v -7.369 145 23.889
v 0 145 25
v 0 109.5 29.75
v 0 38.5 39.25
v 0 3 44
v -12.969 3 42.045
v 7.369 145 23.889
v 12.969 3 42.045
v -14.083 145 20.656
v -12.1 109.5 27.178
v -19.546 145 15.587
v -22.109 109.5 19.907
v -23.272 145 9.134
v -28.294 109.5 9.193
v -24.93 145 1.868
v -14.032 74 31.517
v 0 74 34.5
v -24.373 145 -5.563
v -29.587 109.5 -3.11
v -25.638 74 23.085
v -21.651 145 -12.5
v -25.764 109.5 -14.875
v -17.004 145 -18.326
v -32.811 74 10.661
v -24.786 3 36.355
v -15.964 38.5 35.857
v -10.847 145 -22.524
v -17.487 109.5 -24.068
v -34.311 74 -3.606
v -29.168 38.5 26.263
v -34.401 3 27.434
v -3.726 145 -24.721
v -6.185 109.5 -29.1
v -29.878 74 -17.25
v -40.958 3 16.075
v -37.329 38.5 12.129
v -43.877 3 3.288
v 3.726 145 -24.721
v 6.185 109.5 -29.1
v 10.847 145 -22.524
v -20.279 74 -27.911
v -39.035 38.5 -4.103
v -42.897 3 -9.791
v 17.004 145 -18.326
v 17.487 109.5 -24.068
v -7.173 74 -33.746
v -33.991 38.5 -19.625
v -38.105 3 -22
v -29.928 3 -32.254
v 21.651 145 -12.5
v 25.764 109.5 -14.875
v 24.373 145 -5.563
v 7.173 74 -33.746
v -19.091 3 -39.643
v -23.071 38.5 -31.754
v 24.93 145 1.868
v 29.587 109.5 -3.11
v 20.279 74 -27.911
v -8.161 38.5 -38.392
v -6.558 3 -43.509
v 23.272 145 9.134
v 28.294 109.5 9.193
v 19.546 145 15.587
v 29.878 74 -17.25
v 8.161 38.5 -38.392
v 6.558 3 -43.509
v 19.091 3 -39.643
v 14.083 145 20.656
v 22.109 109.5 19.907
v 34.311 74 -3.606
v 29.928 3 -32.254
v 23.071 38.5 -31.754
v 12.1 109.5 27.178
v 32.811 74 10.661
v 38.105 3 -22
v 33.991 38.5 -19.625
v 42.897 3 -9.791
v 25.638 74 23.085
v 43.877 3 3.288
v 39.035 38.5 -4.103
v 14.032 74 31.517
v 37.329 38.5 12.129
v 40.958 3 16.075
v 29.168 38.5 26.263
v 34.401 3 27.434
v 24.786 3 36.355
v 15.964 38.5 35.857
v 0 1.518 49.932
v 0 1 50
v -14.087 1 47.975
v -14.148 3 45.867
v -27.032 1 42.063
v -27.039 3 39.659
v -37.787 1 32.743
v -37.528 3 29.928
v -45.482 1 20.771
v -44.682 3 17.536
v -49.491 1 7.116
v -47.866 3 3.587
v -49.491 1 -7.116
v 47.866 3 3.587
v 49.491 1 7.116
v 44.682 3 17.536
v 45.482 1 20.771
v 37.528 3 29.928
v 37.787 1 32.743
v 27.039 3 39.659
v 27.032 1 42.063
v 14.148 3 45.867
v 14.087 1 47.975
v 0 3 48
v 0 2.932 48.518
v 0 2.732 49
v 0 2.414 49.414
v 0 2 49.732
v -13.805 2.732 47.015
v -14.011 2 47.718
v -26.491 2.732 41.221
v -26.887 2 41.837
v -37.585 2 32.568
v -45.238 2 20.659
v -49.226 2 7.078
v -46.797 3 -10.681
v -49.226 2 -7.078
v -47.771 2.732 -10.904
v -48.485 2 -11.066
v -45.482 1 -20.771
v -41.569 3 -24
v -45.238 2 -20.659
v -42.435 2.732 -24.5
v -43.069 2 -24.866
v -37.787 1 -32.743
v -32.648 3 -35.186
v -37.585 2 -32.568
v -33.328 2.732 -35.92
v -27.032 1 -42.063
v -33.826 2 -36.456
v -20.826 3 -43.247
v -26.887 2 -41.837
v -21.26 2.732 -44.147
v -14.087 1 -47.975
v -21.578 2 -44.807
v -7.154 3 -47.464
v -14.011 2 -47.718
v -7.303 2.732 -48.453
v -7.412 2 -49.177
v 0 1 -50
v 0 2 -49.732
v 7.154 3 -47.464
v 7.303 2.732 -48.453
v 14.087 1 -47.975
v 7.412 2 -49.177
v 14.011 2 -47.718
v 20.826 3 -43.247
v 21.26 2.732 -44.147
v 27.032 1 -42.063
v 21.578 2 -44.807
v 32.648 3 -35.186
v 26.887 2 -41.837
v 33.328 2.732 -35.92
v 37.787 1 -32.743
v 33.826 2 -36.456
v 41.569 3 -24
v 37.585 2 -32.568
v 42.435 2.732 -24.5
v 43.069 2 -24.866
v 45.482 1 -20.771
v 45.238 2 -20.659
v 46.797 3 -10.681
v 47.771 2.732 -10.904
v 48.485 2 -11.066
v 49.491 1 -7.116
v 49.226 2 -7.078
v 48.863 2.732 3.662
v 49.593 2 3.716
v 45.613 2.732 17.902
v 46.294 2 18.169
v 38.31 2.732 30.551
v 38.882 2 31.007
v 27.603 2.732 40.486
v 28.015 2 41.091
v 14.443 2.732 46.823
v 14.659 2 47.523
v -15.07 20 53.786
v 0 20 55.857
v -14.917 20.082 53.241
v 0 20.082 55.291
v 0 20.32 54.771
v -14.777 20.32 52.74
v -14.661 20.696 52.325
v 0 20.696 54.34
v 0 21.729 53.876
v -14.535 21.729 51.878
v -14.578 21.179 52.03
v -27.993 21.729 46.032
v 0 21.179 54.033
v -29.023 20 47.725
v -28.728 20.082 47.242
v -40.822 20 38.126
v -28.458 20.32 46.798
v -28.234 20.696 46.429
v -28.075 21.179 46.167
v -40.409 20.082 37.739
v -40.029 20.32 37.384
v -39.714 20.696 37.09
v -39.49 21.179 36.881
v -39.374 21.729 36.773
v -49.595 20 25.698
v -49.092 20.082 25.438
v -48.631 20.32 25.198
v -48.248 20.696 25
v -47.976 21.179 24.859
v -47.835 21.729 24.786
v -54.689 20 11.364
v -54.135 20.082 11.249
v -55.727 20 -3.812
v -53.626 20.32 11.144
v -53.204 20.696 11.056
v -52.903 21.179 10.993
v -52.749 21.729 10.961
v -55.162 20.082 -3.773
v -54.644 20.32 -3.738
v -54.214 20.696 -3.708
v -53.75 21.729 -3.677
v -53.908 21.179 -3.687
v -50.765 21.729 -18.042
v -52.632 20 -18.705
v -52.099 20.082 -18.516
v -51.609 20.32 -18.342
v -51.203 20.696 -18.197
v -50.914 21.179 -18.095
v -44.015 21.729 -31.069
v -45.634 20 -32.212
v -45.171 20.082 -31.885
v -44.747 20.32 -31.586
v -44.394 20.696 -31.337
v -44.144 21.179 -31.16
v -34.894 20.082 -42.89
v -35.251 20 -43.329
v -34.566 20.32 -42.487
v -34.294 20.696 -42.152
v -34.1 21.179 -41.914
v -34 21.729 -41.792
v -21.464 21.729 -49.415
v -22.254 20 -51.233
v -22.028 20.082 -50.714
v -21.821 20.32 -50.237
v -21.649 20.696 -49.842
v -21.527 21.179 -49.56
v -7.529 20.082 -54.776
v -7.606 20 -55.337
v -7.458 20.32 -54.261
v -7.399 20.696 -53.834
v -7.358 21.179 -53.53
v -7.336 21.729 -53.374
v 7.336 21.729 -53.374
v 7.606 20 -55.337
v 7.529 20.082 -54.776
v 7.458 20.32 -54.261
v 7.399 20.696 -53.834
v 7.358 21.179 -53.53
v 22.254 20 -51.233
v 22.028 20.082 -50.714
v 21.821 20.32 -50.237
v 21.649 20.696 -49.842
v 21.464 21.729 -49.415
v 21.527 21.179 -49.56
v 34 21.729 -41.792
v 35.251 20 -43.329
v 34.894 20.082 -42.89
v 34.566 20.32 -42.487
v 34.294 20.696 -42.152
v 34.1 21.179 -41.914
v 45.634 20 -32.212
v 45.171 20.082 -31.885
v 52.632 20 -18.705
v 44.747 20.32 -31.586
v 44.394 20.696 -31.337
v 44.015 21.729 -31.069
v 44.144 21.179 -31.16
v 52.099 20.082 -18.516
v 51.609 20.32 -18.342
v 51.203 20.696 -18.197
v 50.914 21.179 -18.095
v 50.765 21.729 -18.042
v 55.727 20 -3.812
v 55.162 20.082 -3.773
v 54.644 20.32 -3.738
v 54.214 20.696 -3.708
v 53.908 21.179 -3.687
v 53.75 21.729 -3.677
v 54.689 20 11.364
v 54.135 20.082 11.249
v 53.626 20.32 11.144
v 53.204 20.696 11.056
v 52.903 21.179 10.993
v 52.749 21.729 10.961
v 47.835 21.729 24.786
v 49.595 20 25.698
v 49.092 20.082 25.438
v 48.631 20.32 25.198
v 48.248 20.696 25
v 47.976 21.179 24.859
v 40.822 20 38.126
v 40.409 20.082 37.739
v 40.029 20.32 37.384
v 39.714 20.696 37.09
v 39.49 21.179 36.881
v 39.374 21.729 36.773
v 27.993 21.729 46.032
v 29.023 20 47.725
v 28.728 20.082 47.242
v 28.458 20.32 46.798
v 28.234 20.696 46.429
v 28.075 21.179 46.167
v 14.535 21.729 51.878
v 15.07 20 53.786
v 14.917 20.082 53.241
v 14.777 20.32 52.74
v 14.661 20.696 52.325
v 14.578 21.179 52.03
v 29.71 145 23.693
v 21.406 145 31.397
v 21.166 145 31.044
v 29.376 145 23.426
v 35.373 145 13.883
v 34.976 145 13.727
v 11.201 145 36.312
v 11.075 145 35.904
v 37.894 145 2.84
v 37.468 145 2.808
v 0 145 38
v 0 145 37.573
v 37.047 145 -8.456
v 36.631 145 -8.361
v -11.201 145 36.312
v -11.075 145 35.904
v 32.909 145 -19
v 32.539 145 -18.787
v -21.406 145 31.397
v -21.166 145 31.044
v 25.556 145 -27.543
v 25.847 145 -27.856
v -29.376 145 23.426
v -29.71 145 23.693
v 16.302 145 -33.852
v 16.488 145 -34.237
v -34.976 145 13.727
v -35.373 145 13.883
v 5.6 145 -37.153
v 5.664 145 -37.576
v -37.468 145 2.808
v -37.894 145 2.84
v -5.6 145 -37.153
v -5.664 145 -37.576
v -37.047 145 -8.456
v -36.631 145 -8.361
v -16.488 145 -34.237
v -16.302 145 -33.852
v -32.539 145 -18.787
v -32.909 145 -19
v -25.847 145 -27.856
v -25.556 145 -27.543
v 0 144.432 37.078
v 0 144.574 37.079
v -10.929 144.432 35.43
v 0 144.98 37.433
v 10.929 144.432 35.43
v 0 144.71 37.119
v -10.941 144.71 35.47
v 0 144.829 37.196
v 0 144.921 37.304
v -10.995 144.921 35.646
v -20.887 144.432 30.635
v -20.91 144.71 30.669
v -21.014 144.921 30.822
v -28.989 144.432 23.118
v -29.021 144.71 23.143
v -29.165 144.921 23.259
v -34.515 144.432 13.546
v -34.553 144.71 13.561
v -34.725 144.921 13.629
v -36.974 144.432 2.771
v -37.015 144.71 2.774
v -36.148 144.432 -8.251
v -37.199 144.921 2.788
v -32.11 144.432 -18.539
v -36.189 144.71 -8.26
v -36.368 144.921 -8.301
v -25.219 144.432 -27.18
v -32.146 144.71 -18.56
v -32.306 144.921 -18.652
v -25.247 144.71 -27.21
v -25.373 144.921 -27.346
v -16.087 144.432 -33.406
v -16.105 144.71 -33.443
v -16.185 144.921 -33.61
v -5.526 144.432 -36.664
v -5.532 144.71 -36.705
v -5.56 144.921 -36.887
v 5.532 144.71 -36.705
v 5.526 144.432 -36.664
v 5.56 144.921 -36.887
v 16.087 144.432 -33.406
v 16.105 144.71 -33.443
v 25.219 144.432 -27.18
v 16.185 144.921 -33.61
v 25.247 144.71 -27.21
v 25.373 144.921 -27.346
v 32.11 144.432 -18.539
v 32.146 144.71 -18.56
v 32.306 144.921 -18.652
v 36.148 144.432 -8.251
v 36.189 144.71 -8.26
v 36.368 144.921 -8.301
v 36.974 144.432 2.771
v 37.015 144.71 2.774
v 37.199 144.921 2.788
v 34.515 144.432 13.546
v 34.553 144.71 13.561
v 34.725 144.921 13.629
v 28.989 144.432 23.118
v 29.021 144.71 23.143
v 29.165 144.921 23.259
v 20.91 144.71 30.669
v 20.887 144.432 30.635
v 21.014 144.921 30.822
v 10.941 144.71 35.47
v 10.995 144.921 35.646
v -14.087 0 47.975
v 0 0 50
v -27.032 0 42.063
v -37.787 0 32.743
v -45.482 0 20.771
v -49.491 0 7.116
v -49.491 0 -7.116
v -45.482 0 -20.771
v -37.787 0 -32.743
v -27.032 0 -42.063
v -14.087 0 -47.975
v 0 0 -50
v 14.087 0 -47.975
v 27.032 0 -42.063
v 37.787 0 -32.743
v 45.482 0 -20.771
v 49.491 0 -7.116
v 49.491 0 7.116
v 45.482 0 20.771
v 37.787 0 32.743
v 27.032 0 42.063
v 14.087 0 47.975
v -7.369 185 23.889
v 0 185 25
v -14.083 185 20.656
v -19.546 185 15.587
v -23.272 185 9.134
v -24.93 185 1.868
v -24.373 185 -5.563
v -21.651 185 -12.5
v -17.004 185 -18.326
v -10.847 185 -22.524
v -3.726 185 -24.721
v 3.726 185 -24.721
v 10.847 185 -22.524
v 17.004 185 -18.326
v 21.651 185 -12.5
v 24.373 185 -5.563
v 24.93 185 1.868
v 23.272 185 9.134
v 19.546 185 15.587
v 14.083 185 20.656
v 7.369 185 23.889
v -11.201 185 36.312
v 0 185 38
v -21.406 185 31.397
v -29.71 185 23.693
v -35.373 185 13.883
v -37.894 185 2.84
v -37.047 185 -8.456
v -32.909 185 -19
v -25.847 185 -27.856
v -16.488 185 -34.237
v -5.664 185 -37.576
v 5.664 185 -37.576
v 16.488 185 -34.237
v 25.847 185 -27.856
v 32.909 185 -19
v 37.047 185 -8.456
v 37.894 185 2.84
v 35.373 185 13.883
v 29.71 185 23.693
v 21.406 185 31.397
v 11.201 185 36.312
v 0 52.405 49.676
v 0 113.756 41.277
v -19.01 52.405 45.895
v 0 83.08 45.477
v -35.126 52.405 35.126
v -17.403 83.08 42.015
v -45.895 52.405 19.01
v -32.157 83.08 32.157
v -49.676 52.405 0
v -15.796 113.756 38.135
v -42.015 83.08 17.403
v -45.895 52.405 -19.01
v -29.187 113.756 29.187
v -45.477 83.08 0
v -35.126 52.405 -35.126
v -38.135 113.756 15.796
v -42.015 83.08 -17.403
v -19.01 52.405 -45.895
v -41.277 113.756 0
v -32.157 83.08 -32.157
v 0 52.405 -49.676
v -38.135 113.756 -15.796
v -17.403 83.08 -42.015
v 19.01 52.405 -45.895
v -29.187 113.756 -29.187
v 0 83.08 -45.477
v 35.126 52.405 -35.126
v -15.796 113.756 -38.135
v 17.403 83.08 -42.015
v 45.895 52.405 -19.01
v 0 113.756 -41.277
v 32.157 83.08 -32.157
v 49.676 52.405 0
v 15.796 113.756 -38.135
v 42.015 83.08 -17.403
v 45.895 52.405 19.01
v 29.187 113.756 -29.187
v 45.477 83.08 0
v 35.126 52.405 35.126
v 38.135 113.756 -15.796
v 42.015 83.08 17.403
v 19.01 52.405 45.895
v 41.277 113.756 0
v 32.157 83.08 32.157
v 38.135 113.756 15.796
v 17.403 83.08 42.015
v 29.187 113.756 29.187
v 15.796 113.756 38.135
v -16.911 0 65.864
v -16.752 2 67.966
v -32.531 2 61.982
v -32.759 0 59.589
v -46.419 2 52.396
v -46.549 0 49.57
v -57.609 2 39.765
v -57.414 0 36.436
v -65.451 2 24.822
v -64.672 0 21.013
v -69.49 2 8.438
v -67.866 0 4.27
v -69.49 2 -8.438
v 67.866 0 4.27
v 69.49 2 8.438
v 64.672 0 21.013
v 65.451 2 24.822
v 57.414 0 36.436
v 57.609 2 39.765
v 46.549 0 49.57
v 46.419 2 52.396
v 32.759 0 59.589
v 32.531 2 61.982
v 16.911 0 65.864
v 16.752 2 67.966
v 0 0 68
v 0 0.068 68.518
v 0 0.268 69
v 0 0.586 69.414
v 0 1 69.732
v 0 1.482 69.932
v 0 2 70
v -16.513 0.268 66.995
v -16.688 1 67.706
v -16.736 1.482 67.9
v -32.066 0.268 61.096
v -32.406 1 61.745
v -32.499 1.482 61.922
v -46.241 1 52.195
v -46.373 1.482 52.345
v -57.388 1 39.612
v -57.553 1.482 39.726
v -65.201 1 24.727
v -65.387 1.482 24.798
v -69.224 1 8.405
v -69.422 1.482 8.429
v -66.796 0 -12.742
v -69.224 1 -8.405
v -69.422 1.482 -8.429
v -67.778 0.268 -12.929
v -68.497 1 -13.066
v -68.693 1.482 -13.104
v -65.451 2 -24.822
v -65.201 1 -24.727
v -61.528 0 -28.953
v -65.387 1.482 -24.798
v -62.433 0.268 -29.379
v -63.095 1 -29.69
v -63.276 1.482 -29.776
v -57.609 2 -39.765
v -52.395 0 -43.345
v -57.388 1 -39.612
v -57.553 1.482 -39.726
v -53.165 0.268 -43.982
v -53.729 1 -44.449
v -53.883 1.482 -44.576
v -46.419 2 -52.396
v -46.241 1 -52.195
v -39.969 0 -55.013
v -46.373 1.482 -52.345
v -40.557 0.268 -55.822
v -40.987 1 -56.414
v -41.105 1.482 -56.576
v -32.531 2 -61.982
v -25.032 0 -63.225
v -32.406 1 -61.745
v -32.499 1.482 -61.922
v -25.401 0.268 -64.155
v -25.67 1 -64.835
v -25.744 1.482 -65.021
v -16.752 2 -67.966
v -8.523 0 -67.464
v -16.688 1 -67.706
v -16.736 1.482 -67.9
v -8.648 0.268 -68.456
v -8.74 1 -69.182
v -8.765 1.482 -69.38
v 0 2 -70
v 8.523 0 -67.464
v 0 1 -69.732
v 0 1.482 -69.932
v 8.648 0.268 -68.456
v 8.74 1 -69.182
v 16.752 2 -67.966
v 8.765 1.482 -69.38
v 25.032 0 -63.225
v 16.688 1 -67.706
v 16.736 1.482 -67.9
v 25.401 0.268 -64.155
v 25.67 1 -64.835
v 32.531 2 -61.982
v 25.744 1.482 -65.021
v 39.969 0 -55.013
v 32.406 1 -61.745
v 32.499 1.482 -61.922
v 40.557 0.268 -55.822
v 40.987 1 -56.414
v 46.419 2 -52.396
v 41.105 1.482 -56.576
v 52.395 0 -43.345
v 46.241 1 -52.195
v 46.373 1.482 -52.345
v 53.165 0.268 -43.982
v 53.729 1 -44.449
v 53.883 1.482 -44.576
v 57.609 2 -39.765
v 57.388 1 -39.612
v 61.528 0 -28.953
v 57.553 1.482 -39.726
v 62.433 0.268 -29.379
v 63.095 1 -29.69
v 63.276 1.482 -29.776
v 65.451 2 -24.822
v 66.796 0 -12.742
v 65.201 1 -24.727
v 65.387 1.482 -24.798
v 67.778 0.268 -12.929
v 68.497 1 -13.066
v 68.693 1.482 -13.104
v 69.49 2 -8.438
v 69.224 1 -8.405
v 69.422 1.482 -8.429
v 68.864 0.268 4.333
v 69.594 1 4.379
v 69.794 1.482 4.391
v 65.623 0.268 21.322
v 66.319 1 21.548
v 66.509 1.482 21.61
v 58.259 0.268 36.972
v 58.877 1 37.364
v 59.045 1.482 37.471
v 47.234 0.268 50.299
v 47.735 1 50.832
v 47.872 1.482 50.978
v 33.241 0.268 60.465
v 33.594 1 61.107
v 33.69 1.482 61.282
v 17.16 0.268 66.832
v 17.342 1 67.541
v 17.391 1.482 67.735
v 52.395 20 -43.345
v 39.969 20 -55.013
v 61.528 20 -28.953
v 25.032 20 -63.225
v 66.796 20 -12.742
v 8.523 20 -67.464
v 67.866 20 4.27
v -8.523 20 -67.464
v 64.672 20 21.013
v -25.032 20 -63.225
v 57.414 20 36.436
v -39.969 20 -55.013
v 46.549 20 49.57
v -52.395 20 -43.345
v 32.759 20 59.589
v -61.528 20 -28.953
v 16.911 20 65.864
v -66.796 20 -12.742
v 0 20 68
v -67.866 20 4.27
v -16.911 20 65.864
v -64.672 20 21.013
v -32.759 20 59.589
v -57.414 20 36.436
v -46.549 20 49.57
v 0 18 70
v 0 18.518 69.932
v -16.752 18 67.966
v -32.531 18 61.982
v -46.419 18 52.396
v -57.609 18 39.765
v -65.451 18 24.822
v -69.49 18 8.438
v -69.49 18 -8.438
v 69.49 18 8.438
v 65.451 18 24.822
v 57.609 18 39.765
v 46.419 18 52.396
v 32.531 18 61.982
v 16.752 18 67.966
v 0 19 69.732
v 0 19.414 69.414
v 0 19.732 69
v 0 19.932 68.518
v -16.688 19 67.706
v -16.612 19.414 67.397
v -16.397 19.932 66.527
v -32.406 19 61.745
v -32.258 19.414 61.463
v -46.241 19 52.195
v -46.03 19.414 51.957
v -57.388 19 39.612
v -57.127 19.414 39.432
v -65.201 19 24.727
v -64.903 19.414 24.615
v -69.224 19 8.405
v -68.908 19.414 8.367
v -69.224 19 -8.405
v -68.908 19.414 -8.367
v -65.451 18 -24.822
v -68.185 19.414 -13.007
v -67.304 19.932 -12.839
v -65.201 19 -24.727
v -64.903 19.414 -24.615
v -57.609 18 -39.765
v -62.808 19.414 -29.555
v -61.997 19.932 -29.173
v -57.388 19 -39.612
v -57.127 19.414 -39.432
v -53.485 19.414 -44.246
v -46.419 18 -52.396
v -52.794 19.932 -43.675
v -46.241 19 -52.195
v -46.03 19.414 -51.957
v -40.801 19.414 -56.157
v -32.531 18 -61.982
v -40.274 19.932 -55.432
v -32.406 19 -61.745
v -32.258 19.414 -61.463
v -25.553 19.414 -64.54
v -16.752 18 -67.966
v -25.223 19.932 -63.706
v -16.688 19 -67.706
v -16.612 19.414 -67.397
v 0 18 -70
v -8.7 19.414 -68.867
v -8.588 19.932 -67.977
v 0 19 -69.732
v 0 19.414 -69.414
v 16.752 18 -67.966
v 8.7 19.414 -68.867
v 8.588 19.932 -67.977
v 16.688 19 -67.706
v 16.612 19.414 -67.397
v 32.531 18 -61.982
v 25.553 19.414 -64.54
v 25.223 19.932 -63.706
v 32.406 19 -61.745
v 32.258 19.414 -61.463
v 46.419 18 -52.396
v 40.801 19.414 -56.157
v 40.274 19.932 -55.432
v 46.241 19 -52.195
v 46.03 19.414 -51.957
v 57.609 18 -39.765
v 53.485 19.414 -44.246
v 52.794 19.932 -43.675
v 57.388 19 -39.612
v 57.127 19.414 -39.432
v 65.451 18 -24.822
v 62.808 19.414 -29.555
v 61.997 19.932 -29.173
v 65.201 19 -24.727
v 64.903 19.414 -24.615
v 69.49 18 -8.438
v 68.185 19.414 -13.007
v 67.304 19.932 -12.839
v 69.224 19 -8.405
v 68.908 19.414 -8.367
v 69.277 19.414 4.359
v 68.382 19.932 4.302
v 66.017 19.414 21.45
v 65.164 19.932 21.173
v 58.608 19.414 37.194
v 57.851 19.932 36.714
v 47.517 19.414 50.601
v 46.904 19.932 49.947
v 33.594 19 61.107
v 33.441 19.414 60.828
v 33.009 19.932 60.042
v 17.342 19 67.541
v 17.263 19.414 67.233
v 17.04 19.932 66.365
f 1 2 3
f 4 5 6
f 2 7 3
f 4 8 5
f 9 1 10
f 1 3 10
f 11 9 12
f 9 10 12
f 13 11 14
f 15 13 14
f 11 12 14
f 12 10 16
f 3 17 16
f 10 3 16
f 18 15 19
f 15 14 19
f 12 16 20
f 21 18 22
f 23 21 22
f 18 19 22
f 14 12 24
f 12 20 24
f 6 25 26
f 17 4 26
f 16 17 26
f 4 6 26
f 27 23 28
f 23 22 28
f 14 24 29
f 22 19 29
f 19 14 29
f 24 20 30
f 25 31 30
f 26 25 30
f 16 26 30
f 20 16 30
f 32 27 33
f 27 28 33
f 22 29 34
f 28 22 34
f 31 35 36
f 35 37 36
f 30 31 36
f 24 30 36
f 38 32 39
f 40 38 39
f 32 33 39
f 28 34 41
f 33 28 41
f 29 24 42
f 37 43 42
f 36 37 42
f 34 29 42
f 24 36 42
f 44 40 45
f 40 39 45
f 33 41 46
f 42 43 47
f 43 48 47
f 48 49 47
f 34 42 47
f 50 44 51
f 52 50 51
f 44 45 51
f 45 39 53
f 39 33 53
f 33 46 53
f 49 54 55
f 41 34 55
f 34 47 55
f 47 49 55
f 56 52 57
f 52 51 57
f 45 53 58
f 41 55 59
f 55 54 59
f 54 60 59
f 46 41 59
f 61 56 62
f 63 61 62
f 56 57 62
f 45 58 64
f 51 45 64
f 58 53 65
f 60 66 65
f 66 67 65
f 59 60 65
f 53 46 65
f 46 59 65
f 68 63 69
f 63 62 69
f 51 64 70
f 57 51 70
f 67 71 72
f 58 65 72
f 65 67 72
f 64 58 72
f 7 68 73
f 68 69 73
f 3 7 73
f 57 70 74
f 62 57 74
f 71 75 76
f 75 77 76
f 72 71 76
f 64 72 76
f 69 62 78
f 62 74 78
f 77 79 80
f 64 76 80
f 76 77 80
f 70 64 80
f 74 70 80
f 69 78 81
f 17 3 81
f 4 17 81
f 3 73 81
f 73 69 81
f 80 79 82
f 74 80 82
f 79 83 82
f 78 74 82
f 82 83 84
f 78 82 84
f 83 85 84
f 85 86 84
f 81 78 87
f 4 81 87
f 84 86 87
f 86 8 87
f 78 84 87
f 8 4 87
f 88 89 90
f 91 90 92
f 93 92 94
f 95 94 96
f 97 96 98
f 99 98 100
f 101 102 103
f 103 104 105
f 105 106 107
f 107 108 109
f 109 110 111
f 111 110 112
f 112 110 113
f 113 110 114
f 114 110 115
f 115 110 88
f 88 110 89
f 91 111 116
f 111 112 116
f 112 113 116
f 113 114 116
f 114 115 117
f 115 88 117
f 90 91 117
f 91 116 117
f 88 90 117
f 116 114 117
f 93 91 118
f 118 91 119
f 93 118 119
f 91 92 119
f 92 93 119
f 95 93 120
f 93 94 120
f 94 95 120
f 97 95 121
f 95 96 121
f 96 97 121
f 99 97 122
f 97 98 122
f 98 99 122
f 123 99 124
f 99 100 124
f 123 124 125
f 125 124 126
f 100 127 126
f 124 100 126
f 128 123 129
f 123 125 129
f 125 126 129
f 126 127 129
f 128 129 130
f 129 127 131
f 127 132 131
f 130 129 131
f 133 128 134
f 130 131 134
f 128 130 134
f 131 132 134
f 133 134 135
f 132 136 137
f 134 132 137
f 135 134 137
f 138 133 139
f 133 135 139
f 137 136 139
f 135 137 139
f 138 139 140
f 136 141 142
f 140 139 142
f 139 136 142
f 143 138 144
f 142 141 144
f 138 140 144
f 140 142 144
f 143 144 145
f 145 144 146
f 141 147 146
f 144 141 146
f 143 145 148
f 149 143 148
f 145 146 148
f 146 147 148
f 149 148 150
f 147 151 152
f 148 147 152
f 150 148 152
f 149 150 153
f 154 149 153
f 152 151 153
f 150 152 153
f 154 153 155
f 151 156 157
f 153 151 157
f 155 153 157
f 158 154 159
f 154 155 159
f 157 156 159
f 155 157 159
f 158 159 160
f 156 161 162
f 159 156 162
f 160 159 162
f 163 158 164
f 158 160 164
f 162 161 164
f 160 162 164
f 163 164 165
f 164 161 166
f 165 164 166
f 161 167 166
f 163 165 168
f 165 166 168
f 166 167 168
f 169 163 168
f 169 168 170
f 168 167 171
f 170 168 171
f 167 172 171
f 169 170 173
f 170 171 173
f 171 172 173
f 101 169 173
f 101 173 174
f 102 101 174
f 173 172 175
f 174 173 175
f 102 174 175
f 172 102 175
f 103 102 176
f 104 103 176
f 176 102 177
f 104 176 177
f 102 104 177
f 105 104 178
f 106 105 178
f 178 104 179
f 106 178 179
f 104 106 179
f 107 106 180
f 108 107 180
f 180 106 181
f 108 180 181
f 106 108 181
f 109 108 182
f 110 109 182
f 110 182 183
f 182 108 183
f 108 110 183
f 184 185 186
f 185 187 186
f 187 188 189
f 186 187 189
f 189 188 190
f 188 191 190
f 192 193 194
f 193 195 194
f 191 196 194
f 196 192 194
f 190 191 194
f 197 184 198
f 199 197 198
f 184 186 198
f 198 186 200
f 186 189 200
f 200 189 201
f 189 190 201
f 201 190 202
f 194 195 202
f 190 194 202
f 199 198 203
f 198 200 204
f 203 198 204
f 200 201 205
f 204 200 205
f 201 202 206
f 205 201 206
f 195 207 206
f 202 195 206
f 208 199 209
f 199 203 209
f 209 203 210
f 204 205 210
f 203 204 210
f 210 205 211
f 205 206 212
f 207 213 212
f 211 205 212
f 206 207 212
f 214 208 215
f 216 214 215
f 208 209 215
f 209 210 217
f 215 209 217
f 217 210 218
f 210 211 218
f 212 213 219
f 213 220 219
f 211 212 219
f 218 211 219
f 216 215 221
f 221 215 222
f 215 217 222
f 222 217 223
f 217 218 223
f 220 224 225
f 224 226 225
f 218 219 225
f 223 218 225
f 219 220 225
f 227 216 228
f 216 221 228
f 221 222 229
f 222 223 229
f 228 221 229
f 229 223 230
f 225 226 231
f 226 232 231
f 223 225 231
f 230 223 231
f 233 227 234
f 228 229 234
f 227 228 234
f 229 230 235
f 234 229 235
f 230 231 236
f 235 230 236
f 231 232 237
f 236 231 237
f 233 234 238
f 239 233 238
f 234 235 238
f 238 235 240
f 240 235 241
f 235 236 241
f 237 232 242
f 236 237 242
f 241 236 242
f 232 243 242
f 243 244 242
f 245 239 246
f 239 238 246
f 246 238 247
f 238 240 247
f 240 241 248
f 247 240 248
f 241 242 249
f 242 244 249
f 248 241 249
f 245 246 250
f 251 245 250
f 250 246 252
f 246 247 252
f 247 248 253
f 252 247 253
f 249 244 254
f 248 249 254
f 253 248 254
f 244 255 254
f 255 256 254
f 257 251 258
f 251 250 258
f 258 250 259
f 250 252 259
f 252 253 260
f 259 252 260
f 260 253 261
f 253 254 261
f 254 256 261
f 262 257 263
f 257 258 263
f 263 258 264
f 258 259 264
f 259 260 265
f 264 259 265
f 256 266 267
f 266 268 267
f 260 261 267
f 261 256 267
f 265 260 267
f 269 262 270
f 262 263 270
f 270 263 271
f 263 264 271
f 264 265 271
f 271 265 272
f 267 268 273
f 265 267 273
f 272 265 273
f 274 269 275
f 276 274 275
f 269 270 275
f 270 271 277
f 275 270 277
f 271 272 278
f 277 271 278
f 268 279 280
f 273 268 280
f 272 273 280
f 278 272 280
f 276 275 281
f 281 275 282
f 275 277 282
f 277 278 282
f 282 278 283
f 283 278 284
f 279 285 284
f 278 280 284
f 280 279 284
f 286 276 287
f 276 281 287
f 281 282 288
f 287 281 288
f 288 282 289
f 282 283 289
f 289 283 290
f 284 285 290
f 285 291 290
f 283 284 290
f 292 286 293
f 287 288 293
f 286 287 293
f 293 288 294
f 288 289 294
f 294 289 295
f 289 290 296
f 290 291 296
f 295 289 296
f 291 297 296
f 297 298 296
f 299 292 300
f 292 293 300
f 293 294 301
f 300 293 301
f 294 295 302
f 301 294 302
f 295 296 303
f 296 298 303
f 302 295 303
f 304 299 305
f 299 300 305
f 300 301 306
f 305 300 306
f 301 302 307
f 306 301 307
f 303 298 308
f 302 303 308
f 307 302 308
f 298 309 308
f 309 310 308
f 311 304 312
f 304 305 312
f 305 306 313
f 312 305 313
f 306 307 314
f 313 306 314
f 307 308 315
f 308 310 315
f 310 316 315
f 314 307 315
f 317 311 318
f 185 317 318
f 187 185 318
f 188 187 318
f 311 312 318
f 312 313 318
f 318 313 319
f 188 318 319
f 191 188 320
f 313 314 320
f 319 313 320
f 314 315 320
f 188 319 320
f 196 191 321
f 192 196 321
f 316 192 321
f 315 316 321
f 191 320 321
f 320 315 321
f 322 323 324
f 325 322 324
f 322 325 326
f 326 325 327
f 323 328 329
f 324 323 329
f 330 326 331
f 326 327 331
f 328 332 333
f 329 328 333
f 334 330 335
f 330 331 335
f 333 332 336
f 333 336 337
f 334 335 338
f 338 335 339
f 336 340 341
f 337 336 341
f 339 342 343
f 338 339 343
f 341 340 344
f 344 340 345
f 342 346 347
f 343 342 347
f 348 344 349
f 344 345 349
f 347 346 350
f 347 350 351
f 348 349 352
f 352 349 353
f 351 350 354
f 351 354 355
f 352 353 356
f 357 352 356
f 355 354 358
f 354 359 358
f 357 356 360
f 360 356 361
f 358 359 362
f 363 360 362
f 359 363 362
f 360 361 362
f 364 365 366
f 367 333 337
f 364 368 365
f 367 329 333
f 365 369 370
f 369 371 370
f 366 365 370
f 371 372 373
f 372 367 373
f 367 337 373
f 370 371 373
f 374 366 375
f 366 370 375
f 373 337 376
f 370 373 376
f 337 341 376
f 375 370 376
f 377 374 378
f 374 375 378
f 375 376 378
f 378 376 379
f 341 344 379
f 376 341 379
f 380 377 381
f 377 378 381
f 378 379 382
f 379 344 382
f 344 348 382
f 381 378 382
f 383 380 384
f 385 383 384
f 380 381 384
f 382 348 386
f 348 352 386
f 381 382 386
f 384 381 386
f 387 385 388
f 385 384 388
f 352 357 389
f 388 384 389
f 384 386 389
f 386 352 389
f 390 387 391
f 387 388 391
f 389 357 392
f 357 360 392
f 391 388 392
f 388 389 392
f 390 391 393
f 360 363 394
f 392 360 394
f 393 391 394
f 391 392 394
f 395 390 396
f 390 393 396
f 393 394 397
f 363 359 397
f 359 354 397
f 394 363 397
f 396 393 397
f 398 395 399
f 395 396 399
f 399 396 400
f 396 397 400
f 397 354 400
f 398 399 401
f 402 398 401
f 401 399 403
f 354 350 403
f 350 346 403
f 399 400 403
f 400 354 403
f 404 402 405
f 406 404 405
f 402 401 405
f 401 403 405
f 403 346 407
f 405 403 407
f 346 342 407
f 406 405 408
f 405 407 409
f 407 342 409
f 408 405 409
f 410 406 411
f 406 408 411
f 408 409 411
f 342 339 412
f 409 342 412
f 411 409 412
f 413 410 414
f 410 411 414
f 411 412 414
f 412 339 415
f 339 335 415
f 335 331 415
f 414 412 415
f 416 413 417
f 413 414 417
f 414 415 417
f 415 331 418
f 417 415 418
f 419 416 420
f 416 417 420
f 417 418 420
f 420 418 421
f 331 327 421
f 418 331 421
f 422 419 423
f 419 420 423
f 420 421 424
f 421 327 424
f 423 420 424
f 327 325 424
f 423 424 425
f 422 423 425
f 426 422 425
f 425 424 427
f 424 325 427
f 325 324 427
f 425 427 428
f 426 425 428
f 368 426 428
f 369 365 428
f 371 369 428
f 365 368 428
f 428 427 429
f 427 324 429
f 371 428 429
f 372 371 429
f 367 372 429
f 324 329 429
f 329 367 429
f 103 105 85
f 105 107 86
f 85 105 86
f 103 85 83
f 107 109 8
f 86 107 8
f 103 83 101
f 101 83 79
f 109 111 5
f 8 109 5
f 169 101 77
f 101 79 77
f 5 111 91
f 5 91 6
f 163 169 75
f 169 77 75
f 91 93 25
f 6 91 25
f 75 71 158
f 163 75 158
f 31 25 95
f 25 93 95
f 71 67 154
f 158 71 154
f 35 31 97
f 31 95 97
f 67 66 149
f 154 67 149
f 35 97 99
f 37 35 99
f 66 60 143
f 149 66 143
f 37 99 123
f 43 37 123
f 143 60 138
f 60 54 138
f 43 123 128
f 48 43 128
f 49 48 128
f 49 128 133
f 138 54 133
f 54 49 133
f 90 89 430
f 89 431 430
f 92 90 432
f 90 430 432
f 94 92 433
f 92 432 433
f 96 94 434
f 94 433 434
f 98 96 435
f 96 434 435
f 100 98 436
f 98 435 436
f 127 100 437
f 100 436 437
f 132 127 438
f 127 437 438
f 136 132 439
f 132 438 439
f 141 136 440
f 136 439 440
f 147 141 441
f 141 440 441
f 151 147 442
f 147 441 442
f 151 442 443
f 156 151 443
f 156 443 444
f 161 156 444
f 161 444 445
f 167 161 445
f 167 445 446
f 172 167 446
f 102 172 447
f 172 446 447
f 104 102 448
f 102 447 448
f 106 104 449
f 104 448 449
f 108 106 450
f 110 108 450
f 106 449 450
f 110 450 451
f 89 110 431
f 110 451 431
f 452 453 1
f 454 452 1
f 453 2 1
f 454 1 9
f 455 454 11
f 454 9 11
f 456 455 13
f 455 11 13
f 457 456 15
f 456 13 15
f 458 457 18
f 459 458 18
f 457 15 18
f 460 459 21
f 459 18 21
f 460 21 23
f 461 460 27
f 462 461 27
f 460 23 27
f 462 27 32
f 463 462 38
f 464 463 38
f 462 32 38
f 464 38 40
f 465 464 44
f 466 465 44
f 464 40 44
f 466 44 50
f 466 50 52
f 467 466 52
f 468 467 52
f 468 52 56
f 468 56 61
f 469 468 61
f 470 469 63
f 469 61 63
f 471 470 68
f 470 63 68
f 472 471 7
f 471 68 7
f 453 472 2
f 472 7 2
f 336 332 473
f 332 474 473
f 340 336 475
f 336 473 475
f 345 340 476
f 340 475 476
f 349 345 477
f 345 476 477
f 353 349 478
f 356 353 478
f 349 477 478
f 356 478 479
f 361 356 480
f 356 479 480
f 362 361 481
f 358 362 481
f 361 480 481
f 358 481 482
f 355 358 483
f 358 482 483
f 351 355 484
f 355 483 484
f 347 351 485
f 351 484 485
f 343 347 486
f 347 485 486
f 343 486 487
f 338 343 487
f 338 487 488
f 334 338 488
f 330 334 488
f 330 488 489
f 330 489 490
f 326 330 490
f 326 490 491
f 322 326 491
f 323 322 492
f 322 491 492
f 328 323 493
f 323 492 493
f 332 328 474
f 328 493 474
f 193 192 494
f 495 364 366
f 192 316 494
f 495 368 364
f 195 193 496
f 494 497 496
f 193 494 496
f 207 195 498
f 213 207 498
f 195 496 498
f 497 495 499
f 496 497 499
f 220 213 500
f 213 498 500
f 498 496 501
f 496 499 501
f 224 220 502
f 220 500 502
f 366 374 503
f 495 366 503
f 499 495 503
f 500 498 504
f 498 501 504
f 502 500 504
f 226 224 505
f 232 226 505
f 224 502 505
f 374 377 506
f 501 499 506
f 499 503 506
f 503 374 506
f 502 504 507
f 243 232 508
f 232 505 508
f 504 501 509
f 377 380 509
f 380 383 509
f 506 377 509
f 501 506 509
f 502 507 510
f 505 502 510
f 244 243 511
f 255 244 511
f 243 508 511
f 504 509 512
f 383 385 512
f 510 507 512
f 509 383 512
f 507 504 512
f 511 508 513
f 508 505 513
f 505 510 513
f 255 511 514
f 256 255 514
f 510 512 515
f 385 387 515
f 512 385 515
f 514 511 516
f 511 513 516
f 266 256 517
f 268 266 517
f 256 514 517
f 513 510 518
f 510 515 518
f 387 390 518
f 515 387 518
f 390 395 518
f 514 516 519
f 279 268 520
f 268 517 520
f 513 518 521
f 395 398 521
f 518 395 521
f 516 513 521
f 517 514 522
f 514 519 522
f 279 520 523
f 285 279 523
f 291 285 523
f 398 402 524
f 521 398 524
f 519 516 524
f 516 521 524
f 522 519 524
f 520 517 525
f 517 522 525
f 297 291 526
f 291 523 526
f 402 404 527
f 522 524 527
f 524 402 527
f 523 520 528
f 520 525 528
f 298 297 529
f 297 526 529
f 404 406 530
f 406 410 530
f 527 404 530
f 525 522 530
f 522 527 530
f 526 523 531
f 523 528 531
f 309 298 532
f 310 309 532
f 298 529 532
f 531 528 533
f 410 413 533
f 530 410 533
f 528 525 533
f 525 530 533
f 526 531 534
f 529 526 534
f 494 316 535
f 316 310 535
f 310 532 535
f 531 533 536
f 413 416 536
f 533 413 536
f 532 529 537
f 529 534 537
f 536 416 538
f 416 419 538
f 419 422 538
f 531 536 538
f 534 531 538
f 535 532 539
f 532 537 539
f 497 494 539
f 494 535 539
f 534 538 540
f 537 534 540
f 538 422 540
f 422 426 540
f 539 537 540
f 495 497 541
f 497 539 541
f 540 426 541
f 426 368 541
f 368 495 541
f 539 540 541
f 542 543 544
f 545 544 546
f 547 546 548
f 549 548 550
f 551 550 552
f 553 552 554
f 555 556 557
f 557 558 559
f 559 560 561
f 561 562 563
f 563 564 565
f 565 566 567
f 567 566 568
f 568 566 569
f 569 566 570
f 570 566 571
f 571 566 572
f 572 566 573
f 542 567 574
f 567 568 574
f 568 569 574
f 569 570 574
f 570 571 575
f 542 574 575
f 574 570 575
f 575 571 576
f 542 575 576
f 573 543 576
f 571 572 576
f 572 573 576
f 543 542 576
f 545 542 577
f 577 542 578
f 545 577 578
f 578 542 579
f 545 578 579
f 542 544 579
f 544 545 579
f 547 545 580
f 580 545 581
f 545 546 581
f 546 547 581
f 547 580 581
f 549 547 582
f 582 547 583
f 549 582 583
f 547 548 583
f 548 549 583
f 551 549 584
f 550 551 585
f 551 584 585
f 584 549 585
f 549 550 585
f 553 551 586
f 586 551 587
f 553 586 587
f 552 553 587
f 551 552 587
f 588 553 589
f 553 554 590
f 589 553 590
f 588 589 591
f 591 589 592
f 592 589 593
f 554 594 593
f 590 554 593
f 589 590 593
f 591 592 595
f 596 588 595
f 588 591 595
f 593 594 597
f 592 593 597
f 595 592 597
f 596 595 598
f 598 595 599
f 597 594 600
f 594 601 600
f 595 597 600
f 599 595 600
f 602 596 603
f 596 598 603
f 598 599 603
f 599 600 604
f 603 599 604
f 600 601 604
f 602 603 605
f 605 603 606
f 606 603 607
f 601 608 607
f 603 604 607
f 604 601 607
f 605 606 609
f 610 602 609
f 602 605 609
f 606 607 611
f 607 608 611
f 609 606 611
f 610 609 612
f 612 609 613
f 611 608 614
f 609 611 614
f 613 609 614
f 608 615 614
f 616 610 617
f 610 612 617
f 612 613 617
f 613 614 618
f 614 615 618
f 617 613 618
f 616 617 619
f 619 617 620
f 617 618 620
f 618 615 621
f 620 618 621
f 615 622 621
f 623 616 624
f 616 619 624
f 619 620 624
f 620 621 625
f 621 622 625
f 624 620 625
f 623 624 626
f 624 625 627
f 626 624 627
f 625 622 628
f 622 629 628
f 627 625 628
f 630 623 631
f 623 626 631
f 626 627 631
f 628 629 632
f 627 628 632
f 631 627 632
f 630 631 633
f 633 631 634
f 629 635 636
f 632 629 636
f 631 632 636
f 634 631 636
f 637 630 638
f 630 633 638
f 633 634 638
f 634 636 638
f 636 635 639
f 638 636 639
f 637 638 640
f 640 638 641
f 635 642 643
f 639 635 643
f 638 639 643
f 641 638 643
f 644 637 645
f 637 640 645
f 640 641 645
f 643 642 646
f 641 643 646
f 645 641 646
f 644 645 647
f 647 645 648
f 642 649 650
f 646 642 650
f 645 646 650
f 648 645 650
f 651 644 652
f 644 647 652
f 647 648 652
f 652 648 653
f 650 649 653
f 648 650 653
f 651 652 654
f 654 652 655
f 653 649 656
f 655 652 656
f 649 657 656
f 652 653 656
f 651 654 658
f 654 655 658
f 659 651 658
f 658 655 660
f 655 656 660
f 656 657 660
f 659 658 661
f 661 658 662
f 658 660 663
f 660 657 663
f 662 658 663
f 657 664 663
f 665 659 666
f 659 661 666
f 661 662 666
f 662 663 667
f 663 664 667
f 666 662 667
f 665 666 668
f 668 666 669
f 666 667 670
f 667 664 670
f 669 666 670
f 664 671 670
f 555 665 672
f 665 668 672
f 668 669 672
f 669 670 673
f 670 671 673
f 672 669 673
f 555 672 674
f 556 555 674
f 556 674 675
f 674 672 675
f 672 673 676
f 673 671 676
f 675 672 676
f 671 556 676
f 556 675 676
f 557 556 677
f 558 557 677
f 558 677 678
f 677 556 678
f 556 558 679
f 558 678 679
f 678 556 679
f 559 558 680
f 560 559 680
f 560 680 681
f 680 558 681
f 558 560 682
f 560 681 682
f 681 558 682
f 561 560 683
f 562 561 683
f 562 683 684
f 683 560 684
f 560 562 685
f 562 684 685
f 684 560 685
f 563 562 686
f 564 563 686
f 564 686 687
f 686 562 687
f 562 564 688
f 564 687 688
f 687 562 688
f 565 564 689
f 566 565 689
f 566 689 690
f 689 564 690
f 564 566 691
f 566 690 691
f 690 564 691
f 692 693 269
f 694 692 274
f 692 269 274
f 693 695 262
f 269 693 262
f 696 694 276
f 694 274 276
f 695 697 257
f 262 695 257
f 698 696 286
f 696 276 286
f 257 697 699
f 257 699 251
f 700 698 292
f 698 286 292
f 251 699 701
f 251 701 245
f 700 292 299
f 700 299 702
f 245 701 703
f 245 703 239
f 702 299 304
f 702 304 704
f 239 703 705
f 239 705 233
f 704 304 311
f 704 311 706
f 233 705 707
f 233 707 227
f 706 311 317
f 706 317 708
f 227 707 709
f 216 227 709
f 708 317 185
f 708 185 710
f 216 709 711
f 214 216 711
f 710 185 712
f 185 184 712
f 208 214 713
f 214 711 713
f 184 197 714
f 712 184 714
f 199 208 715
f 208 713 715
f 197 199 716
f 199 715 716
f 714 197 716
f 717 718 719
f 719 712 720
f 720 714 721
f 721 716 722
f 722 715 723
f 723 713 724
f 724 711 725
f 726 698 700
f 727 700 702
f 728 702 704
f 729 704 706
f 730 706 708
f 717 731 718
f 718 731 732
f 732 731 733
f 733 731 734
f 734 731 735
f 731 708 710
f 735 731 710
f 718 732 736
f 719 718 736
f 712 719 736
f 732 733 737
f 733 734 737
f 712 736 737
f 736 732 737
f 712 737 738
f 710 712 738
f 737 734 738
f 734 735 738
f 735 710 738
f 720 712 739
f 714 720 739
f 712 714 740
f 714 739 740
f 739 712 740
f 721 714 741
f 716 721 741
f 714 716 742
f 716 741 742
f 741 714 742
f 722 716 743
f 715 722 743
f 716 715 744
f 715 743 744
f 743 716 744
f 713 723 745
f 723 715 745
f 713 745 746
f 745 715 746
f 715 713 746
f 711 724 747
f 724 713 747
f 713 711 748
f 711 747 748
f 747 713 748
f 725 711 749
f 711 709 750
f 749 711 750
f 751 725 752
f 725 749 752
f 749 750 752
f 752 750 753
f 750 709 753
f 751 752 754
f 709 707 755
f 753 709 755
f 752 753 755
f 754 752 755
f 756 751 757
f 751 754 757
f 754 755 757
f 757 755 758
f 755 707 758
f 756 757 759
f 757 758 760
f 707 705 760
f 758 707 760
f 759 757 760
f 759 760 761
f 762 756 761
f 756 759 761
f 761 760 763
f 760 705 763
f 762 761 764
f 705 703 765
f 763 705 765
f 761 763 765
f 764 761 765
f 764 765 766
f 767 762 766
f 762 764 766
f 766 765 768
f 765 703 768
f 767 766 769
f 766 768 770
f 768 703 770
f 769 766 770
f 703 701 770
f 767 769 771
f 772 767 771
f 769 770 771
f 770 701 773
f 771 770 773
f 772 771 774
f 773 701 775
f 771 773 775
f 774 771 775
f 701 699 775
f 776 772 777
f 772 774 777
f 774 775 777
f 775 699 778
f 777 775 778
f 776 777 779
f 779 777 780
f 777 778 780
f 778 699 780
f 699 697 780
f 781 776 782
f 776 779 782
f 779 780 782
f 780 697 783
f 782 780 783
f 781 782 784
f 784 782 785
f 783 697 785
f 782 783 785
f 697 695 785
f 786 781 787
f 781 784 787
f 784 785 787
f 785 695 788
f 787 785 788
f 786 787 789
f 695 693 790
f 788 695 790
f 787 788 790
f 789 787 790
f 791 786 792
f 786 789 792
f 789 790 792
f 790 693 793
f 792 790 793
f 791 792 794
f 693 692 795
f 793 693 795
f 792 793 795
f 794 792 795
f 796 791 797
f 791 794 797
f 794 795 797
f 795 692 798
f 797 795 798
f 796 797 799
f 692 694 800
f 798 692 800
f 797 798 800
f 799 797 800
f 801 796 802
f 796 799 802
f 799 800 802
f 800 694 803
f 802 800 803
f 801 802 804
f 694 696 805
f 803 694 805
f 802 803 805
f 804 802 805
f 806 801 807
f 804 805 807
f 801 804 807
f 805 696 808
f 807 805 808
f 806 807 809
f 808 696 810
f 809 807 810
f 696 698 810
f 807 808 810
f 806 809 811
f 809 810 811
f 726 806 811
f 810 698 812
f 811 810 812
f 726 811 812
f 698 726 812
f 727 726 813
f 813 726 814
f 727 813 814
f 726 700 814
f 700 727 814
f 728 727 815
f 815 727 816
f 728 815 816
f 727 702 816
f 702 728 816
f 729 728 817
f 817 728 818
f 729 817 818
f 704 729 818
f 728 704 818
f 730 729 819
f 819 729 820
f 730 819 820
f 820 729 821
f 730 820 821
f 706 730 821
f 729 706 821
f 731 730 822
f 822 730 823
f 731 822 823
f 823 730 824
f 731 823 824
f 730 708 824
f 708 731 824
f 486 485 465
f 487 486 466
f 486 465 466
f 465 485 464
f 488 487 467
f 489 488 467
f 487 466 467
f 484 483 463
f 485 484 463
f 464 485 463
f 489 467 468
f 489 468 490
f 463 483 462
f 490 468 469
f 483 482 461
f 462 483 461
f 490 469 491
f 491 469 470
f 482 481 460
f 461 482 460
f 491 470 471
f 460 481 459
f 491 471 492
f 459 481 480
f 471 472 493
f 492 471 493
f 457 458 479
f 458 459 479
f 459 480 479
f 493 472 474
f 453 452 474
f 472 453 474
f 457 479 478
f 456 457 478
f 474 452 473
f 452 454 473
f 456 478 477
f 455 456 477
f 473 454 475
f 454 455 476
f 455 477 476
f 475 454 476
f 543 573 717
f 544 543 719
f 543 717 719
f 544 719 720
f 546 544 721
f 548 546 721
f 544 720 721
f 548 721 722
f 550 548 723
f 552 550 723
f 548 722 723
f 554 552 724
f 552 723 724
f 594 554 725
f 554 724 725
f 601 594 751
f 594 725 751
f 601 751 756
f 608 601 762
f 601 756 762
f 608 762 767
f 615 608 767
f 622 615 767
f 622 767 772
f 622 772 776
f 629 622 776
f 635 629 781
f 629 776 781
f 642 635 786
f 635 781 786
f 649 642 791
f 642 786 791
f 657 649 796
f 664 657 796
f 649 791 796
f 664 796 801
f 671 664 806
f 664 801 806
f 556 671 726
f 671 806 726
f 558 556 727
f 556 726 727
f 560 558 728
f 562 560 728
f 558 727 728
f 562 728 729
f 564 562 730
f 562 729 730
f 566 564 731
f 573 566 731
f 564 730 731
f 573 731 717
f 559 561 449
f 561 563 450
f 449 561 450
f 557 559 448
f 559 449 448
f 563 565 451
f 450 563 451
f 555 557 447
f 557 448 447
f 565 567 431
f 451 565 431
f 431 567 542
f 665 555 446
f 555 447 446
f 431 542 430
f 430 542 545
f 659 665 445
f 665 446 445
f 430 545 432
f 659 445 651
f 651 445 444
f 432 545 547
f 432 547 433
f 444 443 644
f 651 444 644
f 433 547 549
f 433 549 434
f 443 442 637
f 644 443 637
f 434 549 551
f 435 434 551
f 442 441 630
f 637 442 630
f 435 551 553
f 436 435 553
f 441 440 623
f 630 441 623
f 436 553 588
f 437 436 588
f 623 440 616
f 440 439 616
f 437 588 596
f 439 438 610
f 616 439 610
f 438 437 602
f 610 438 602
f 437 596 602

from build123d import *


with BuildPart() as part:
    # Sketch1 → Revolve1 (revolve)
    with BuildSketch(Plane.XY, mode=Mode.PRIVATE) as revolve1_sk:
        with BuildLine():
            Line((50, 1), (50, 0))
            Line((50, 0), (68, 0))
            ThreePointArc((68, 0), (69.414213562, 0.585786438), (70, 2))
            Line((70, 2), (70, 18))
            ThreePointArc((70, 18), (69.414213562, 19.414213562), (68, 20))
            Line((68, 20), (55.857196988, 20))
            ThreePointArc((55.857196988, 20), (54.542384187, 20.492927574), (53.87567887, 21.728732703))
            Line((53.87567887, 21.728732703), (46.5, 75.605633803))
            Line((46.5, 75.605633803), (37.077733397, 144.432183176))
            ThreePointArc((37.077733397, 144.432183176), (37.19634482, 144.8287032), (37.573112927, 145))
            Line((37.573112927, 145), (38, 145))
            Line((38, 145), (38, 185))
            Line((38, 185), (25, 185))
            Line((25, 185), (25, 145))
            Line((25, 145), (44, 3))
            Line((44, 3), (48, 3))
            ThreePointArc((48, 3), (49.414213562, 2.414213562), (50, 1))
        make_face()
    revolve(revolve1_sk.sketch.rotate(Axis((0, 185, 0), (0, -1, 0)), 90), axis=Axis((0, 185, 0), (0, -1, 0)))


solid = part.part
